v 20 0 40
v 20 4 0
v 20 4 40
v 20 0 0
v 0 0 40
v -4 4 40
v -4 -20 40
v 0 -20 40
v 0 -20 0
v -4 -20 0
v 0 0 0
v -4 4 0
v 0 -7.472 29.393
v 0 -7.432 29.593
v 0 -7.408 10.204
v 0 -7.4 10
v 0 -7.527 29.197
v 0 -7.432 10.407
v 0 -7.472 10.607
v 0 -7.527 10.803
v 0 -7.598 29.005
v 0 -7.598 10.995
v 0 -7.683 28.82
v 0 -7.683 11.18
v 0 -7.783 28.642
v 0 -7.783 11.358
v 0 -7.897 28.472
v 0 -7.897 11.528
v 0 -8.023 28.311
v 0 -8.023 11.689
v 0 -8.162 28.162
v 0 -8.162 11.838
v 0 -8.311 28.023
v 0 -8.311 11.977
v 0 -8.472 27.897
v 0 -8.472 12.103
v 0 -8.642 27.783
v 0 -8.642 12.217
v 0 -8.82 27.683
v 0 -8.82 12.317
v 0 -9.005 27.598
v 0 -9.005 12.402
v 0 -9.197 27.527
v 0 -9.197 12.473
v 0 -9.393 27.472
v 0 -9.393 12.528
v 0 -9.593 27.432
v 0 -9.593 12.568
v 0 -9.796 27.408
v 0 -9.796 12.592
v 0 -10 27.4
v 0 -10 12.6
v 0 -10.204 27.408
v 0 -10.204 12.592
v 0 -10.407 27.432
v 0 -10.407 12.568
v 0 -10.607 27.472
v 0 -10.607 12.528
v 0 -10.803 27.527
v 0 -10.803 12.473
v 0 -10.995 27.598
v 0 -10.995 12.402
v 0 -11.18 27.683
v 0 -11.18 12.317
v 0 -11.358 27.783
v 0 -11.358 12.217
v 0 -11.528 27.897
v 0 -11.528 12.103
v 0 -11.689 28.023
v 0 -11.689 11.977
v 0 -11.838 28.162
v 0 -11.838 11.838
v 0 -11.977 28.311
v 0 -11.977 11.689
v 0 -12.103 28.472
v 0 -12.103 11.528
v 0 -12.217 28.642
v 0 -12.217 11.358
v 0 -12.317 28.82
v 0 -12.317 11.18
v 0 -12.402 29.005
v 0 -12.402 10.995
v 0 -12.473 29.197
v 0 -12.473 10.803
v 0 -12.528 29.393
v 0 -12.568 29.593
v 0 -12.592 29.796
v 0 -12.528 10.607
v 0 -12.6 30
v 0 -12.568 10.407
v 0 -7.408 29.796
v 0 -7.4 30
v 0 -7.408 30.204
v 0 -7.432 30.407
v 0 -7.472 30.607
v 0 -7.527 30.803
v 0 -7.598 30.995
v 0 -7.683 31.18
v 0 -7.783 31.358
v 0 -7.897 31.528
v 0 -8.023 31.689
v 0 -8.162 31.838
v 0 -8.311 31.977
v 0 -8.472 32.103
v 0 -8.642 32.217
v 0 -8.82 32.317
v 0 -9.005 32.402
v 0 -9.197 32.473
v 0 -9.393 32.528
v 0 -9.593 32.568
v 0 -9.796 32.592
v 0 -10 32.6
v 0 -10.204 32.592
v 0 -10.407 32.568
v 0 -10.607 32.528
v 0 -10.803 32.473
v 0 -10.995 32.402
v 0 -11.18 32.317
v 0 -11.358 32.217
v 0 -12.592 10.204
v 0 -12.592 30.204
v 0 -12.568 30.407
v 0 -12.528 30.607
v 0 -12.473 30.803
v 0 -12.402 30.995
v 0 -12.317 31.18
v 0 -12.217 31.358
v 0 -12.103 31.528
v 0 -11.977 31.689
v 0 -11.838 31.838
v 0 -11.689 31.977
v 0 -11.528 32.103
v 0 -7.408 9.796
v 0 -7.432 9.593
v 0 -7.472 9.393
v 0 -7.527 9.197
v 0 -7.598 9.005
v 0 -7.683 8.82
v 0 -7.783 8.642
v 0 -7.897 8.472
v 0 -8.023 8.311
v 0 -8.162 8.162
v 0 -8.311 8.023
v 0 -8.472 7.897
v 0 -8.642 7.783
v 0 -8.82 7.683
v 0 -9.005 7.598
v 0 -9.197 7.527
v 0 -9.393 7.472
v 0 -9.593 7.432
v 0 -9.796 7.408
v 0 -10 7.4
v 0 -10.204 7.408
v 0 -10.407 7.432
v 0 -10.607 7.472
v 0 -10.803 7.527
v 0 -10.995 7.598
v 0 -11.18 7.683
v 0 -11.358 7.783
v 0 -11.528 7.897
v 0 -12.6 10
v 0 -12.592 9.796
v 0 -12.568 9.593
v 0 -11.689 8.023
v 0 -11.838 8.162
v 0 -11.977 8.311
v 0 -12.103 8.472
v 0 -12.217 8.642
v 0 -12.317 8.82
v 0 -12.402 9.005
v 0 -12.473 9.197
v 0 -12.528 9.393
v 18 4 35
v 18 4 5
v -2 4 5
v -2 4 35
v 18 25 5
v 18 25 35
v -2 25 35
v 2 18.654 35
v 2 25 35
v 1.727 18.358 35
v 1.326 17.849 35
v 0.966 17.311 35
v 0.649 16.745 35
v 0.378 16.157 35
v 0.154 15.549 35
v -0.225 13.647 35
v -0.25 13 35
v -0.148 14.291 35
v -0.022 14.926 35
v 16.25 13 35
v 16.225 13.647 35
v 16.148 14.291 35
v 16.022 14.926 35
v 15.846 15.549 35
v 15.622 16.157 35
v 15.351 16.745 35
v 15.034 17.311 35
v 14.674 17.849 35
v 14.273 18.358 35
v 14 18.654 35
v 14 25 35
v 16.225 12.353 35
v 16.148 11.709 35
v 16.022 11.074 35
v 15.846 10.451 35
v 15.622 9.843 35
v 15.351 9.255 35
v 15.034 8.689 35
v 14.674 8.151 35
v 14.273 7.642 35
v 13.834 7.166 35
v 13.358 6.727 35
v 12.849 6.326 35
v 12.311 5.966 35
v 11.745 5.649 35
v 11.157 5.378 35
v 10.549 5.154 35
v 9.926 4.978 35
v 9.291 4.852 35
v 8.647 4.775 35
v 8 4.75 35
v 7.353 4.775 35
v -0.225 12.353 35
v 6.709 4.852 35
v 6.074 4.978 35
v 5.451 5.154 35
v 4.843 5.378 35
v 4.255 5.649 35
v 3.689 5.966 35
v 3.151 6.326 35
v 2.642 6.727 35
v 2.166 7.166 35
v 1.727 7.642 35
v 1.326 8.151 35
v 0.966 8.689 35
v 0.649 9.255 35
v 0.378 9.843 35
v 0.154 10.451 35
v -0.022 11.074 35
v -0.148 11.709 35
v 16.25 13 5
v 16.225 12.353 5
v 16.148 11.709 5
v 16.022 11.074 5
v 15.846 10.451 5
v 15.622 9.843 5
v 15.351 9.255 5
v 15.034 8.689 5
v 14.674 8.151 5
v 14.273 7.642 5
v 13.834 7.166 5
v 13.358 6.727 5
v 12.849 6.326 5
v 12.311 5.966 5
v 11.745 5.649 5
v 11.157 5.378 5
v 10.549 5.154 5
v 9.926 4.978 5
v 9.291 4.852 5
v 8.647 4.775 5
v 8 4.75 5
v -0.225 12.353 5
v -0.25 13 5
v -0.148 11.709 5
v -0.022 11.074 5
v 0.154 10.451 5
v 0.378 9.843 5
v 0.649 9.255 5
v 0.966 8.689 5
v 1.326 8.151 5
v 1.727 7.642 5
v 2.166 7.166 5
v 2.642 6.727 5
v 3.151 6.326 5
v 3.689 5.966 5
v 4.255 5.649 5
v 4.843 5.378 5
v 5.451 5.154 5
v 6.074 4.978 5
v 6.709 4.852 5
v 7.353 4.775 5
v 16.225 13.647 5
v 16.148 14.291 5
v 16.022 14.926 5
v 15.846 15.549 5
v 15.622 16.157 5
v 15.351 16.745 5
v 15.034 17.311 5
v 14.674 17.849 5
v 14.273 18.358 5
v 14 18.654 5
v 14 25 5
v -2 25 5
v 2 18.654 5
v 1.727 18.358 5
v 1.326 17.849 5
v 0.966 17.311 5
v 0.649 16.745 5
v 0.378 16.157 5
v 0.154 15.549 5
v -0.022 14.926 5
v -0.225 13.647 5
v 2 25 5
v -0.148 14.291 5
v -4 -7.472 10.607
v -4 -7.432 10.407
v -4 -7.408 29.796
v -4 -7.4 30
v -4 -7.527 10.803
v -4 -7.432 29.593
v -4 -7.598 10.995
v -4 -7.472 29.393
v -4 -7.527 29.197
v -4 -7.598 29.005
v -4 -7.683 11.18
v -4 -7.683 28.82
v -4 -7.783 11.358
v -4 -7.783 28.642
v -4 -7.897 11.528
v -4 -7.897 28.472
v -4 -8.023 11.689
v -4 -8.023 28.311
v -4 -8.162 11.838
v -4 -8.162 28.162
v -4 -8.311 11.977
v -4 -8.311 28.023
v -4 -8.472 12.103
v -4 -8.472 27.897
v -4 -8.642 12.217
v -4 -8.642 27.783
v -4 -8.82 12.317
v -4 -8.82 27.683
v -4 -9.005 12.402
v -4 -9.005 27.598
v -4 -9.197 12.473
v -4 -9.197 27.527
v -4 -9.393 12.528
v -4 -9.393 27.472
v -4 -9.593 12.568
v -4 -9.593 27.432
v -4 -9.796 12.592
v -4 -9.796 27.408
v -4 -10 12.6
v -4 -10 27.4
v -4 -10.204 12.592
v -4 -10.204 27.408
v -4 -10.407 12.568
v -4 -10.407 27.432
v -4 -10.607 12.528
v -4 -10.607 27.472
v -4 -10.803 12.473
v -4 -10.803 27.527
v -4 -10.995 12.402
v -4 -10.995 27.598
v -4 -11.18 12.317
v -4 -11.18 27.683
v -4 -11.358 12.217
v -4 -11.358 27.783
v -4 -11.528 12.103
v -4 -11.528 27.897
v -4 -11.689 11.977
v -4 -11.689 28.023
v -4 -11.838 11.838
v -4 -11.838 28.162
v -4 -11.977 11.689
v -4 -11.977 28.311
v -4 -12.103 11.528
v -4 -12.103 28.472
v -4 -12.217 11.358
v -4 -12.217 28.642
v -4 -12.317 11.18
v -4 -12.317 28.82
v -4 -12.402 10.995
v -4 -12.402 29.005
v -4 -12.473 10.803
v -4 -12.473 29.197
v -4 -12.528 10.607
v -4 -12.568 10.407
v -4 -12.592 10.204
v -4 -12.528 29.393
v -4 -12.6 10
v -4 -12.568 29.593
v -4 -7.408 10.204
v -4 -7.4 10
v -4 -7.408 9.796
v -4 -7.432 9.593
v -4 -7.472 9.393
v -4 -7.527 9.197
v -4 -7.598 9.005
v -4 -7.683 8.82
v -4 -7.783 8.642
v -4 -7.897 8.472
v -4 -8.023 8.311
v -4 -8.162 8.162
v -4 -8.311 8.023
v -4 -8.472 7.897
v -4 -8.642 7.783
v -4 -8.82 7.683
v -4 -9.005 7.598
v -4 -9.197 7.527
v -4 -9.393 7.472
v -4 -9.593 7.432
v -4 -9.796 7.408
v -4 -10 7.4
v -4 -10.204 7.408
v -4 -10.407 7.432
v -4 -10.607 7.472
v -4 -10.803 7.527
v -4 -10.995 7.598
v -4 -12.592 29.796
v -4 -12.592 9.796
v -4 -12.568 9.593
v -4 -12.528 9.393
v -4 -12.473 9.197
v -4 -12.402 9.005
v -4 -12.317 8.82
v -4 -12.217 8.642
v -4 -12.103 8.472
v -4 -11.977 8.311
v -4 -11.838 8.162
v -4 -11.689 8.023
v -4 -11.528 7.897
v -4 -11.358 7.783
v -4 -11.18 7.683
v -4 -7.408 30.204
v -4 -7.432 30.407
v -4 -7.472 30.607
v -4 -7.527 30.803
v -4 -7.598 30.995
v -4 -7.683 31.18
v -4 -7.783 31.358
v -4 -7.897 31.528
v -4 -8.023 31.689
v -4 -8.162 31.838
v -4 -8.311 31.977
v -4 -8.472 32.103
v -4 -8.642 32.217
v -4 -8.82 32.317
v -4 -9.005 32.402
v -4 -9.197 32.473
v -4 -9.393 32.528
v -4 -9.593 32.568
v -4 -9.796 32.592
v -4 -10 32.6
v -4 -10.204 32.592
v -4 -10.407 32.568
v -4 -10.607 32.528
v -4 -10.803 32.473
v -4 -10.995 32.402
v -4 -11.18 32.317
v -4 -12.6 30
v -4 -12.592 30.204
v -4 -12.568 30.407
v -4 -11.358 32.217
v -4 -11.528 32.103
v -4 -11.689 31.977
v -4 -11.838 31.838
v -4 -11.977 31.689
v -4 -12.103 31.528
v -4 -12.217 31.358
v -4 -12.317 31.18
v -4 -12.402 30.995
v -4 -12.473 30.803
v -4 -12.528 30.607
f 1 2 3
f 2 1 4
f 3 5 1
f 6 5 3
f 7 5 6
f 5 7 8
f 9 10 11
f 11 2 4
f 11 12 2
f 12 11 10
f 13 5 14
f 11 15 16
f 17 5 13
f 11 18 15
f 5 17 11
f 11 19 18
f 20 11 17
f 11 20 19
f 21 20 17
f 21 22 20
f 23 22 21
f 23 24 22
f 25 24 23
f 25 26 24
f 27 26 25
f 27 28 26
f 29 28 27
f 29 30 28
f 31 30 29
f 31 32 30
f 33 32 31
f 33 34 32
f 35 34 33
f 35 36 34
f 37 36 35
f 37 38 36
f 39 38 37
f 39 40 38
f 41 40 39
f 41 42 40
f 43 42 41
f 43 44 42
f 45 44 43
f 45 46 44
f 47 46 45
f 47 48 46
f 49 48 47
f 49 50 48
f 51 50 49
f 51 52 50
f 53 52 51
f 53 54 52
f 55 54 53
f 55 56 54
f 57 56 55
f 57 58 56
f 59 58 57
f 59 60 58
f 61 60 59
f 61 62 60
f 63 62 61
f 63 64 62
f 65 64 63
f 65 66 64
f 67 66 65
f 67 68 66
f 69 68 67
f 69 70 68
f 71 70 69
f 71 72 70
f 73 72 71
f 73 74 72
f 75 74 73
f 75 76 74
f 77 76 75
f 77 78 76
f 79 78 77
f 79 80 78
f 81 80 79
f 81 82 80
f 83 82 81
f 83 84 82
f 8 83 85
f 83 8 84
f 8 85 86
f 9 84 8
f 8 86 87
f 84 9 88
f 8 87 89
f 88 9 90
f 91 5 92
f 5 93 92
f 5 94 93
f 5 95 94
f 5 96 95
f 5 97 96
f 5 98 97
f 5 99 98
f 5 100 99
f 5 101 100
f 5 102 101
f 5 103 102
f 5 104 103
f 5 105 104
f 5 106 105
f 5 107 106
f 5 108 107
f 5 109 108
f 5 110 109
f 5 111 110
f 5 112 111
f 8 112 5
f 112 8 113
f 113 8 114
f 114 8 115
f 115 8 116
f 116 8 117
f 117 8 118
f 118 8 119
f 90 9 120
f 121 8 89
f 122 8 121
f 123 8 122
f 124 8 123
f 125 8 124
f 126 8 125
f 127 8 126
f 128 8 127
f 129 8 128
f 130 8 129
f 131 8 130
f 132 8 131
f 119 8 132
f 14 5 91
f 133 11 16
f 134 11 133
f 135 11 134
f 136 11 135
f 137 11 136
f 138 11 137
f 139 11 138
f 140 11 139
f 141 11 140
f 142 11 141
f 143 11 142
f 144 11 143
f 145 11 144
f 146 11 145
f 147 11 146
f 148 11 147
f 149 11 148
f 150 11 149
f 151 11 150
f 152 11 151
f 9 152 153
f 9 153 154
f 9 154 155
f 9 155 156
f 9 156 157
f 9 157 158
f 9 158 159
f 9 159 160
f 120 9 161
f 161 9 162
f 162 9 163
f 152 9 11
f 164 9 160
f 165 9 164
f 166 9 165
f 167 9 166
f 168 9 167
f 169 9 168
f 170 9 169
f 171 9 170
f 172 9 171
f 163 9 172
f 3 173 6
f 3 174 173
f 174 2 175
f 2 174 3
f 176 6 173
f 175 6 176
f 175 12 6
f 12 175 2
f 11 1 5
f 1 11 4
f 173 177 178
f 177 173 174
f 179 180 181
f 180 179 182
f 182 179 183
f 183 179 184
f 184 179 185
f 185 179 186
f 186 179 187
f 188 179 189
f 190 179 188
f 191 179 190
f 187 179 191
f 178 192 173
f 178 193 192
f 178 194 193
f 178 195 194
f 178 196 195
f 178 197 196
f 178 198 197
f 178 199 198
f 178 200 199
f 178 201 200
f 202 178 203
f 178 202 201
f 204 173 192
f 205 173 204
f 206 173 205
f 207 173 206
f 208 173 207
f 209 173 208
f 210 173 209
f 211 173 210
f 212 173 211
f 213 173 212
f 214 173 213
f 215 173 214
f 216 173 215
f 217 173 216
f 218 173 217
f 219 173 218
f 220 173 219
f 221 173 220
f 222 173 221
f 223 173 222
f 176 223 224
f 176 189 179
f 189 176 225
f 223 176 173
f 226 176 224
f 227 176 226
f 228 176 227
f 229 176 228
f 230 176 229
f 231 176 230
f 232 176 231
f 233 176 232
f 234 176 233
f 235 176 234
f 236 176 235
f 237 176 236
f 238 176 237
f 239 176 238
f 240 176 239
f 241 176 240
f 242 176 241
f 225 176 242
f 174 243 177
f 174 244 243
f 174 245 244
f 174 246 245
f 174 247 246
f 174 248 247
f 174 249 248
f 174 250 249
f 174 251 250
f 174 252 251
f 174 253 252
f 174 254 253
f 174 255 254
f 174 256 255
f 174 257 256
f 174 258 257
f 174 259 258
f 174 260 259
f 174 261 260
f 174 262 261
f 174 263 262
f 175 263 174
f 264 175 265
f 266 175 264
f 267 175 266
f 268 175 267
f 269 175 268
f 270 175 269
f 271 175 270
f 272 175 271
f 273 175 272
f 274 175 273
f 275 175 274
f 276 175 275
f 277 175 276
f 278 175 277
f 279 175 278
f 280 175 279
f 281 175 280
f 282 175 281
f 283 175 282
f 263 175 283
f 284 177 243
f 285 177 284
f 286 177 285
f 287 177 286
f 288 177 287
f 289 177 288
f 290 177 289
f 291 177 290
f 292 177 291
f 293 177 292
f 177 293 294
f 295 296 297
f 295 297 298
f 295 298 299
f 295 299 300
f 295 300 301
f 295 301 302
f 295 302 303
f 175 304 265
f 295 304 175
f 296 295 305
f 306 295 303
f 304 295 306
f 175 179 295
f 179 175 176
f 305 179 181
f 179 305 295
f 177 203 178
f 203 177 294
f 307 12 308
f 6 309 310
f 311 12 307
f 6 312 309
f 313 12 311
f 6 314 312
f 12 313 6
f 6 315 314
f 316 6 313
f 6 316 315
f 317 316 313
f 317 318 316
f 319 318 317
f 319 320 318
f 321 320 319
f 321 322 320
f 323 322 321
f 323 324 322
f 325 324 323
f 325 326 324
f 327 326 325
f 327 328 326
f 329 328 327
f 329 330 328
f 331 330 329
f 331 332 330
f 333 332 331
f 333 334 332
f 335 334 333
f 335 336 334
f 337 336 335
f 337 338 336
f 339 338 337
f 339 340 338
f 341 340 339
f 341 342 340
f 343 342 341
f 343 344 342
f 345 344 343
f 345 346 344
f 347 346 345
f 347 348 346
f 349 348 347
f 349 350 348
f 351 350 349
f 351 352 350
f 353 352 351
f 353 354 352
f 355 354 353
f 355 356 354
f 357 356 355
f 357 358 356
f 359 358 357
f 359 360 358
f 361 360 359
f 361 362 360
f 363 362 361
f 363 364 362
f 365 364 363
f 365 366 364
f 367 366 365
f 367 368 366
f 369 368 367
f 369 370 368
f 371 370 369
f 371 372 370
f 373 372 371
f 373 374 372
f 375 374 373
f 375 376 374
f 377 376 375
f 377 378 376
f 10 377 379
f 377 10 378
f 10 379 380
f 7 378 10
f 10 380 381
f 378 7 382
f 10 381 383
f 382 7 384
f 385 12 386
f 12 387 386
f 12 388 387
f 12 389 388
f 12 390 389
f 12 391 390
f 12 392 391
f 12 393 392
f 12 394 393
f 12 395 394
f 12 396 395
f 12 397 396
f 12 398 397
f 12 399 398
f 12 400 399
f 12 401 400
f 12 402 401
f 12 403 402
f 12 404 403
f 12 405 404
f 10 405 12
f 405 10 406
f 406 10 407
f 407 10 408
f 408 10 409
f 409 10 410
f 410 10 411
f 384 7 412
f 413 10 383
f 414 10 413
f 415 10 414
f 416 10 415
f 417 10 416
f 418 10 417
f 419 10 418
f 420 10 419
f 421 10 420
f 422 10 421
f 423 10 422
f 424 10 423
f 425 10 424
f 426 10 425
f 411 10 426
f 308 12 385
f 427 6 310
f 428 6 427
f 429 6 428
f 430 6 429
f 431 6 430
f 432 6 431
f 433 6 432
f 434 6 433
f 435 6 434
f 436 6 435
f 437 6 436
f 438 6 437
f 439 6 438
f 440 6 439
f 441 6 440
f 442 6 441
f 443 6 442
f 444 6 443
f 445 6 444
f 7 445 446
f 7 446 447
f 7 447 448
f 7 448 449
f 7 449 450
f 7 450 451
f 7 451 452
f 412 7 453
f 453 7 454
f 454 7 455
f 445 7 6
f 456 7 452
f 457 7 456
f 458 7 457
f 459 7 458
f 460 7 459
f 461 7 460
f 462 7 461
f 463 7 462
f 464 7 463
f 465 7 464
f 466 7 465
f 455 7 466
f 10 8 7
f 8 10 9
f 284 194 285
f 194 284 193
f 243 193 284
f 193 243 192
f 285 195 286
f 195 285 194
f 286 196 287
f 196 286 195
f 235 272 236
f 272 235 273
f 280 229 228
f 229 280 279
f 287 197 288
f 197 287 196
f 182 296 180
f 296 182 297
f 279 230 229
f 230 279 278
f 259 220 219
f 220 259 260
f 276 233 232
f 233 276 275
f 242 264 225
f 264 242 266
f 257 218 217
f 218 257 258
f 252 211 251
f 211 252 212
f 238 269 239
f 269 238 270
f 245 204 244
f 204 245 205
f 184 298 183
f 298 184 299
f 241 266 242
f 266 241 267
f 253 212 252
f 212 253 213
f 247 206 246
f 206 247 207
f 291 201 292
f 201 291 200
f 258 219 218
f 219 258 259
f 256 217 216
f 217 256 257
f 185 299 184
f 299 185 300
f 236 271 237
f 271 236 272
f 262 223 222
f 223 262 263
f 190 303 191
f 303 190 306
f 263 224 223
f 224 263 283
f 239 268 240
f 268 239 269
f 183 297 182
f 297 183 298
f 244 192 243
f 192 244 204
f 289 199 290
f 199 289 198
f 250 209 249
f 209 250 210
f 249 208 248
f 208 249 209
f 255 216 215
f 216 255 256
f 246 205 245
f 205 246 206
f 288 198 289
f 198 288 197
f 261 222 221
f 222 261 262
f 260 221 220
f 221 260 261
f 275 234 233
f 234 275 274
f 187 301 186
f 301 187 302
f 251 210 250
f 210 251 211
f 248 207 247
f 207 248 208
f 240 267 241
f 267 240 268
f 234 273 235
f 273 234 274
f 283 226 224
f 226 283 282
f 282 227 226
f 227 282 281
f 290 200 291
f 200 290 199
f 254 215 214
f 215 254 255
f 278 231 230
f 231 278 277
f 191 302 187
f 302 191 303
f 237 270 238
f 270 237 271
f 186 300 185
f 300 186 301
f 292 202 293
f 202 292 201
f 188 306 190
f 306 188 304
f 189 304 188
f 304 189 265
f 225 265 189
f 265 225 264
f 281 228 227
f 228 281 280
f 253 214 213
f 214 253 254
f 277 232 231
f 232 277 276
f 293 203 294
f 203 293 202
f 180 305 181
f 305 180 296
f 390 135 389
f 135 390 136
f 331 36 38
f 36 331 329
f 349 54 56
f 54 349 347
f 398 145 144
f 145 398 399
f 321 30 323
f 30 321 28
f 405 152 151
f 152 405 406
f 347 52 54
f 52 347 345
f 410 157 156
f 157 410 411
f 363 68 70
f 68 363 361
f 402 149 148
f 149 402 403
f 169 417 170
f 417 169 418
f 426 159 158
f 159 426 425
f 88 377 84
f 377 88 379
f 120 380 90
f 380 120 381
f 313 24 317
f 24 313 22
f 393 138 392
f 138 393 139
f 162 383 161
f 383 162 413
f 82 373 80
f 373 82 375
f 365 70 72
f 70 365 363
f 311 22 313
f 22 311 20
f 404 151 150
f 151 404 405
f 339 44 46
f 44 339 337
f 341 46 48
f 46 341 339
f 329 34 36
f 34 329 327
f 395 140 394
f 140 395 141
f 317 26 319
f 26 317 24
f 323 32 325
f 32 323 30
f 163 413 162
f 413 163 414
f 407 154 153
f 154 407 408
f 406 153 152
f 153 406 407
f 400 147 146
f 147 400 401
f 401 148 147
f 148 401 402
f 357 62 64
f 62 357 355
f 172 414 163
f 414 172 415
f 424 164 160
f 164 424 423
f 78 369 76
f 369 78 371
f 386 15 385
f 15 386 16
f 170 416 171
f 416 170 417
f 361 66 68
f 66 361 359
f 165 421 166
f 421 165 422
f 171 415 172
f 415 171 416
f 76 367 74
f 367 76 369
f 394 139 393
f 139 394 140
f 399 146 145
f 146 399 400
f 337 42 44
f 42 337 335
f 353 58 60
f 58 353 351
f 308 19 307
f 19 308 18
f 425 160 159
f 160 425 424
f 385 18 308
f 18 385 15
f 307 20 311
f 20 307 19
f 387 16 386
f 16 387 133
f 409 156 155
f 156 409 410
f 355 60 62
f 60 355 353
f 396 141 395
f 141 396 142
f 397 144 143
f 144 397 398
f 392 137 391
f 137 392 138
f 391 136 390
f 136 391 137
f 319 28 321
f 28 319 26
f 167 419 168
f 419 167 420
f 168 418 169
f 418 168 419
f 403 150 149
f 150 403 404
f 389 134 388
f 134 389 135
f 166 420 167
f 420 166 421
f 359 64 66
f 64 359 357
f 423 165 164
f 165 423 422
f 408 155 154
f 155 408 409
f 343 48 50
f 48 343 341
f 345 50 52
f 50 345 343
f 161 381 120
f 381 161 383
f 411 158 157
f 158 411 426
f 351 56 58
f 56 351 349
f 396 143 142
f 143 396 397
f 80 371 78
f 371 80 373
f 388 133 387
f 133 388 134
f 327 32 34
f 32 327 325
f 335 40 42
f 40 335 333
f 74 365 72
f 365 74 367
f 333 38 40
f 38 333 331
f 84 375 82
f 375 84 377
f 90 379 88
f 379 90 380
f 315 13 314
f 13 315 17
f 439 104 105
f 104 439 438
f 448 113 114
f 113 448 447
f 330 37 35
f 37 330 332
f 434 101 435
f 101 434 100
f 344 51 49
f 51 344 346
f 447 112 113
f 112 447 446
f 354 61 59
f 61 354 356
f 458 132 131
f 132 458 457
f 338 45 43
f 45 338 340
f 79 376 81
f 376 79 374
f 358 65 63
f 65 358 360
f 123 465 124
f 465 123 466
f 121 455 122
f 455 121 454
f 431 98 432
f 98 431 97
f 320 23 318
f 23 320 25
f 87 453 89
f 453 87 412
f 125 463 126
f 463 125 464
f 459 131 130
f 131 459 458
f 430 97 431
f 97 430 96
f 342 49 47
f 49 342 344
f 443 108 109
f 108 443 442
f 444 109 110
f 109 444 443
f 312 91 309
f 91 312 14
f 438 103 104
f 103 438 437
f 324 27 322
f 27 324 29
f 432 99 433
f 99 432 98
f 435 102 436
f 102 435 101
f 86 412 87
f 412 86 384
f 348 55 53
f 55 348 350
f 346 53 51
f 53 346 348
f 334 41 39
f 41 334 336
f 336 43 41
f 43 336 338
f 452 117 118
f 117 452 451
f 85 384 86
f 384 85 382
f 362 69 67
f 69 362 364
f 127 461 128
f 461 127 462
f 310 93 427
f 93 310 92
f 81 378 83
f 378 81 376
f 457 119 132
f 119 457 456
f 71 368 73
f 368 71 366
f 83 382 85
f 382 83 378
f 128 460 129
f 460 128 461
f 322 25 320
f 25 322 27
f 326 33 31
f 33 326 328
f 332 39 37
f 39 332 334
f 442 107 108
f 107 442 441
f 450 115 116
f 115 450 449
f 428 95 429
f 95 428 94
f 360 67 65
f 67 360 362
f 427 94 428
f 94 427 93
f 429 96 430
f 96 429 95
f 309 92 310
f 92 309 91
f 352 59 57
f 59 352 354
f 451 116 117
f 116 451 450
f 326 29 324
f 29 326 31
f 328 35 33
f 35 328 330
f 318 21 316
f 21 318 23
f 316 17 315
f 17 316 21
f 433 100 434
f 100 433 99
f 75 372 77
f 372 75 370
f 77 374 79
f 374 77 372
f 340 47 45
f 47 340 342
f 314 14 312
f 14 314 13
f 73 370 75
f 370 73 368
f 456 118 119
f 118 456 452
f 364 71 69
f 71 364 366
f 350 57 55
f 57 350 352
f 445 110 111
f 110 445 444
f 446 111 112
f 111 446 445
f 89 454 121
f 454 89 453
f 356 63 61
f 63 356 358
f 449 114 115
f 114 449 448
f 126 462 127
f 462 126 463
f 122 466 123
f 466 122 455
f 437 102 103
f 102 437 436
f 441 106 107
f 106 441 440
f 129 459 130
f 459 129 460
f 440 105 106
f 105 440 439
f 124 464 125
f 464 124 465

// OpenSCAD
//mini pump holder
$fn=80;

difference() {
    union() {
        cube([20, 4, 40]);
        translate([-2, 1, 5]) cube([20, 24, 30]);
        translate([-4, -20, 0]) cube([4, 24, 40]);
    }
    //translate([10, 14, 15]) cylinder(d=12, h=45);
    translate([8, 13, 3]) cylinder(d=16.5, h=51);
    //translate([-3, 4.75, 33]) cube([11, 10, 51]);
    translate([2, 17, 3]) cube([12, 10, 51]);
    translate([-7, -10, 10]) rotate([0, 90, 0]) cylinder(d=5.2, h=10);
    translate([-7, -10, 30]) rotate([0, 90, 0]) cylinder(d=5.2, h=10);
    //translate([10, -3, 7]) rotate([-90, 0, 0]) cylinder(d=3.6, h=10);
    }
